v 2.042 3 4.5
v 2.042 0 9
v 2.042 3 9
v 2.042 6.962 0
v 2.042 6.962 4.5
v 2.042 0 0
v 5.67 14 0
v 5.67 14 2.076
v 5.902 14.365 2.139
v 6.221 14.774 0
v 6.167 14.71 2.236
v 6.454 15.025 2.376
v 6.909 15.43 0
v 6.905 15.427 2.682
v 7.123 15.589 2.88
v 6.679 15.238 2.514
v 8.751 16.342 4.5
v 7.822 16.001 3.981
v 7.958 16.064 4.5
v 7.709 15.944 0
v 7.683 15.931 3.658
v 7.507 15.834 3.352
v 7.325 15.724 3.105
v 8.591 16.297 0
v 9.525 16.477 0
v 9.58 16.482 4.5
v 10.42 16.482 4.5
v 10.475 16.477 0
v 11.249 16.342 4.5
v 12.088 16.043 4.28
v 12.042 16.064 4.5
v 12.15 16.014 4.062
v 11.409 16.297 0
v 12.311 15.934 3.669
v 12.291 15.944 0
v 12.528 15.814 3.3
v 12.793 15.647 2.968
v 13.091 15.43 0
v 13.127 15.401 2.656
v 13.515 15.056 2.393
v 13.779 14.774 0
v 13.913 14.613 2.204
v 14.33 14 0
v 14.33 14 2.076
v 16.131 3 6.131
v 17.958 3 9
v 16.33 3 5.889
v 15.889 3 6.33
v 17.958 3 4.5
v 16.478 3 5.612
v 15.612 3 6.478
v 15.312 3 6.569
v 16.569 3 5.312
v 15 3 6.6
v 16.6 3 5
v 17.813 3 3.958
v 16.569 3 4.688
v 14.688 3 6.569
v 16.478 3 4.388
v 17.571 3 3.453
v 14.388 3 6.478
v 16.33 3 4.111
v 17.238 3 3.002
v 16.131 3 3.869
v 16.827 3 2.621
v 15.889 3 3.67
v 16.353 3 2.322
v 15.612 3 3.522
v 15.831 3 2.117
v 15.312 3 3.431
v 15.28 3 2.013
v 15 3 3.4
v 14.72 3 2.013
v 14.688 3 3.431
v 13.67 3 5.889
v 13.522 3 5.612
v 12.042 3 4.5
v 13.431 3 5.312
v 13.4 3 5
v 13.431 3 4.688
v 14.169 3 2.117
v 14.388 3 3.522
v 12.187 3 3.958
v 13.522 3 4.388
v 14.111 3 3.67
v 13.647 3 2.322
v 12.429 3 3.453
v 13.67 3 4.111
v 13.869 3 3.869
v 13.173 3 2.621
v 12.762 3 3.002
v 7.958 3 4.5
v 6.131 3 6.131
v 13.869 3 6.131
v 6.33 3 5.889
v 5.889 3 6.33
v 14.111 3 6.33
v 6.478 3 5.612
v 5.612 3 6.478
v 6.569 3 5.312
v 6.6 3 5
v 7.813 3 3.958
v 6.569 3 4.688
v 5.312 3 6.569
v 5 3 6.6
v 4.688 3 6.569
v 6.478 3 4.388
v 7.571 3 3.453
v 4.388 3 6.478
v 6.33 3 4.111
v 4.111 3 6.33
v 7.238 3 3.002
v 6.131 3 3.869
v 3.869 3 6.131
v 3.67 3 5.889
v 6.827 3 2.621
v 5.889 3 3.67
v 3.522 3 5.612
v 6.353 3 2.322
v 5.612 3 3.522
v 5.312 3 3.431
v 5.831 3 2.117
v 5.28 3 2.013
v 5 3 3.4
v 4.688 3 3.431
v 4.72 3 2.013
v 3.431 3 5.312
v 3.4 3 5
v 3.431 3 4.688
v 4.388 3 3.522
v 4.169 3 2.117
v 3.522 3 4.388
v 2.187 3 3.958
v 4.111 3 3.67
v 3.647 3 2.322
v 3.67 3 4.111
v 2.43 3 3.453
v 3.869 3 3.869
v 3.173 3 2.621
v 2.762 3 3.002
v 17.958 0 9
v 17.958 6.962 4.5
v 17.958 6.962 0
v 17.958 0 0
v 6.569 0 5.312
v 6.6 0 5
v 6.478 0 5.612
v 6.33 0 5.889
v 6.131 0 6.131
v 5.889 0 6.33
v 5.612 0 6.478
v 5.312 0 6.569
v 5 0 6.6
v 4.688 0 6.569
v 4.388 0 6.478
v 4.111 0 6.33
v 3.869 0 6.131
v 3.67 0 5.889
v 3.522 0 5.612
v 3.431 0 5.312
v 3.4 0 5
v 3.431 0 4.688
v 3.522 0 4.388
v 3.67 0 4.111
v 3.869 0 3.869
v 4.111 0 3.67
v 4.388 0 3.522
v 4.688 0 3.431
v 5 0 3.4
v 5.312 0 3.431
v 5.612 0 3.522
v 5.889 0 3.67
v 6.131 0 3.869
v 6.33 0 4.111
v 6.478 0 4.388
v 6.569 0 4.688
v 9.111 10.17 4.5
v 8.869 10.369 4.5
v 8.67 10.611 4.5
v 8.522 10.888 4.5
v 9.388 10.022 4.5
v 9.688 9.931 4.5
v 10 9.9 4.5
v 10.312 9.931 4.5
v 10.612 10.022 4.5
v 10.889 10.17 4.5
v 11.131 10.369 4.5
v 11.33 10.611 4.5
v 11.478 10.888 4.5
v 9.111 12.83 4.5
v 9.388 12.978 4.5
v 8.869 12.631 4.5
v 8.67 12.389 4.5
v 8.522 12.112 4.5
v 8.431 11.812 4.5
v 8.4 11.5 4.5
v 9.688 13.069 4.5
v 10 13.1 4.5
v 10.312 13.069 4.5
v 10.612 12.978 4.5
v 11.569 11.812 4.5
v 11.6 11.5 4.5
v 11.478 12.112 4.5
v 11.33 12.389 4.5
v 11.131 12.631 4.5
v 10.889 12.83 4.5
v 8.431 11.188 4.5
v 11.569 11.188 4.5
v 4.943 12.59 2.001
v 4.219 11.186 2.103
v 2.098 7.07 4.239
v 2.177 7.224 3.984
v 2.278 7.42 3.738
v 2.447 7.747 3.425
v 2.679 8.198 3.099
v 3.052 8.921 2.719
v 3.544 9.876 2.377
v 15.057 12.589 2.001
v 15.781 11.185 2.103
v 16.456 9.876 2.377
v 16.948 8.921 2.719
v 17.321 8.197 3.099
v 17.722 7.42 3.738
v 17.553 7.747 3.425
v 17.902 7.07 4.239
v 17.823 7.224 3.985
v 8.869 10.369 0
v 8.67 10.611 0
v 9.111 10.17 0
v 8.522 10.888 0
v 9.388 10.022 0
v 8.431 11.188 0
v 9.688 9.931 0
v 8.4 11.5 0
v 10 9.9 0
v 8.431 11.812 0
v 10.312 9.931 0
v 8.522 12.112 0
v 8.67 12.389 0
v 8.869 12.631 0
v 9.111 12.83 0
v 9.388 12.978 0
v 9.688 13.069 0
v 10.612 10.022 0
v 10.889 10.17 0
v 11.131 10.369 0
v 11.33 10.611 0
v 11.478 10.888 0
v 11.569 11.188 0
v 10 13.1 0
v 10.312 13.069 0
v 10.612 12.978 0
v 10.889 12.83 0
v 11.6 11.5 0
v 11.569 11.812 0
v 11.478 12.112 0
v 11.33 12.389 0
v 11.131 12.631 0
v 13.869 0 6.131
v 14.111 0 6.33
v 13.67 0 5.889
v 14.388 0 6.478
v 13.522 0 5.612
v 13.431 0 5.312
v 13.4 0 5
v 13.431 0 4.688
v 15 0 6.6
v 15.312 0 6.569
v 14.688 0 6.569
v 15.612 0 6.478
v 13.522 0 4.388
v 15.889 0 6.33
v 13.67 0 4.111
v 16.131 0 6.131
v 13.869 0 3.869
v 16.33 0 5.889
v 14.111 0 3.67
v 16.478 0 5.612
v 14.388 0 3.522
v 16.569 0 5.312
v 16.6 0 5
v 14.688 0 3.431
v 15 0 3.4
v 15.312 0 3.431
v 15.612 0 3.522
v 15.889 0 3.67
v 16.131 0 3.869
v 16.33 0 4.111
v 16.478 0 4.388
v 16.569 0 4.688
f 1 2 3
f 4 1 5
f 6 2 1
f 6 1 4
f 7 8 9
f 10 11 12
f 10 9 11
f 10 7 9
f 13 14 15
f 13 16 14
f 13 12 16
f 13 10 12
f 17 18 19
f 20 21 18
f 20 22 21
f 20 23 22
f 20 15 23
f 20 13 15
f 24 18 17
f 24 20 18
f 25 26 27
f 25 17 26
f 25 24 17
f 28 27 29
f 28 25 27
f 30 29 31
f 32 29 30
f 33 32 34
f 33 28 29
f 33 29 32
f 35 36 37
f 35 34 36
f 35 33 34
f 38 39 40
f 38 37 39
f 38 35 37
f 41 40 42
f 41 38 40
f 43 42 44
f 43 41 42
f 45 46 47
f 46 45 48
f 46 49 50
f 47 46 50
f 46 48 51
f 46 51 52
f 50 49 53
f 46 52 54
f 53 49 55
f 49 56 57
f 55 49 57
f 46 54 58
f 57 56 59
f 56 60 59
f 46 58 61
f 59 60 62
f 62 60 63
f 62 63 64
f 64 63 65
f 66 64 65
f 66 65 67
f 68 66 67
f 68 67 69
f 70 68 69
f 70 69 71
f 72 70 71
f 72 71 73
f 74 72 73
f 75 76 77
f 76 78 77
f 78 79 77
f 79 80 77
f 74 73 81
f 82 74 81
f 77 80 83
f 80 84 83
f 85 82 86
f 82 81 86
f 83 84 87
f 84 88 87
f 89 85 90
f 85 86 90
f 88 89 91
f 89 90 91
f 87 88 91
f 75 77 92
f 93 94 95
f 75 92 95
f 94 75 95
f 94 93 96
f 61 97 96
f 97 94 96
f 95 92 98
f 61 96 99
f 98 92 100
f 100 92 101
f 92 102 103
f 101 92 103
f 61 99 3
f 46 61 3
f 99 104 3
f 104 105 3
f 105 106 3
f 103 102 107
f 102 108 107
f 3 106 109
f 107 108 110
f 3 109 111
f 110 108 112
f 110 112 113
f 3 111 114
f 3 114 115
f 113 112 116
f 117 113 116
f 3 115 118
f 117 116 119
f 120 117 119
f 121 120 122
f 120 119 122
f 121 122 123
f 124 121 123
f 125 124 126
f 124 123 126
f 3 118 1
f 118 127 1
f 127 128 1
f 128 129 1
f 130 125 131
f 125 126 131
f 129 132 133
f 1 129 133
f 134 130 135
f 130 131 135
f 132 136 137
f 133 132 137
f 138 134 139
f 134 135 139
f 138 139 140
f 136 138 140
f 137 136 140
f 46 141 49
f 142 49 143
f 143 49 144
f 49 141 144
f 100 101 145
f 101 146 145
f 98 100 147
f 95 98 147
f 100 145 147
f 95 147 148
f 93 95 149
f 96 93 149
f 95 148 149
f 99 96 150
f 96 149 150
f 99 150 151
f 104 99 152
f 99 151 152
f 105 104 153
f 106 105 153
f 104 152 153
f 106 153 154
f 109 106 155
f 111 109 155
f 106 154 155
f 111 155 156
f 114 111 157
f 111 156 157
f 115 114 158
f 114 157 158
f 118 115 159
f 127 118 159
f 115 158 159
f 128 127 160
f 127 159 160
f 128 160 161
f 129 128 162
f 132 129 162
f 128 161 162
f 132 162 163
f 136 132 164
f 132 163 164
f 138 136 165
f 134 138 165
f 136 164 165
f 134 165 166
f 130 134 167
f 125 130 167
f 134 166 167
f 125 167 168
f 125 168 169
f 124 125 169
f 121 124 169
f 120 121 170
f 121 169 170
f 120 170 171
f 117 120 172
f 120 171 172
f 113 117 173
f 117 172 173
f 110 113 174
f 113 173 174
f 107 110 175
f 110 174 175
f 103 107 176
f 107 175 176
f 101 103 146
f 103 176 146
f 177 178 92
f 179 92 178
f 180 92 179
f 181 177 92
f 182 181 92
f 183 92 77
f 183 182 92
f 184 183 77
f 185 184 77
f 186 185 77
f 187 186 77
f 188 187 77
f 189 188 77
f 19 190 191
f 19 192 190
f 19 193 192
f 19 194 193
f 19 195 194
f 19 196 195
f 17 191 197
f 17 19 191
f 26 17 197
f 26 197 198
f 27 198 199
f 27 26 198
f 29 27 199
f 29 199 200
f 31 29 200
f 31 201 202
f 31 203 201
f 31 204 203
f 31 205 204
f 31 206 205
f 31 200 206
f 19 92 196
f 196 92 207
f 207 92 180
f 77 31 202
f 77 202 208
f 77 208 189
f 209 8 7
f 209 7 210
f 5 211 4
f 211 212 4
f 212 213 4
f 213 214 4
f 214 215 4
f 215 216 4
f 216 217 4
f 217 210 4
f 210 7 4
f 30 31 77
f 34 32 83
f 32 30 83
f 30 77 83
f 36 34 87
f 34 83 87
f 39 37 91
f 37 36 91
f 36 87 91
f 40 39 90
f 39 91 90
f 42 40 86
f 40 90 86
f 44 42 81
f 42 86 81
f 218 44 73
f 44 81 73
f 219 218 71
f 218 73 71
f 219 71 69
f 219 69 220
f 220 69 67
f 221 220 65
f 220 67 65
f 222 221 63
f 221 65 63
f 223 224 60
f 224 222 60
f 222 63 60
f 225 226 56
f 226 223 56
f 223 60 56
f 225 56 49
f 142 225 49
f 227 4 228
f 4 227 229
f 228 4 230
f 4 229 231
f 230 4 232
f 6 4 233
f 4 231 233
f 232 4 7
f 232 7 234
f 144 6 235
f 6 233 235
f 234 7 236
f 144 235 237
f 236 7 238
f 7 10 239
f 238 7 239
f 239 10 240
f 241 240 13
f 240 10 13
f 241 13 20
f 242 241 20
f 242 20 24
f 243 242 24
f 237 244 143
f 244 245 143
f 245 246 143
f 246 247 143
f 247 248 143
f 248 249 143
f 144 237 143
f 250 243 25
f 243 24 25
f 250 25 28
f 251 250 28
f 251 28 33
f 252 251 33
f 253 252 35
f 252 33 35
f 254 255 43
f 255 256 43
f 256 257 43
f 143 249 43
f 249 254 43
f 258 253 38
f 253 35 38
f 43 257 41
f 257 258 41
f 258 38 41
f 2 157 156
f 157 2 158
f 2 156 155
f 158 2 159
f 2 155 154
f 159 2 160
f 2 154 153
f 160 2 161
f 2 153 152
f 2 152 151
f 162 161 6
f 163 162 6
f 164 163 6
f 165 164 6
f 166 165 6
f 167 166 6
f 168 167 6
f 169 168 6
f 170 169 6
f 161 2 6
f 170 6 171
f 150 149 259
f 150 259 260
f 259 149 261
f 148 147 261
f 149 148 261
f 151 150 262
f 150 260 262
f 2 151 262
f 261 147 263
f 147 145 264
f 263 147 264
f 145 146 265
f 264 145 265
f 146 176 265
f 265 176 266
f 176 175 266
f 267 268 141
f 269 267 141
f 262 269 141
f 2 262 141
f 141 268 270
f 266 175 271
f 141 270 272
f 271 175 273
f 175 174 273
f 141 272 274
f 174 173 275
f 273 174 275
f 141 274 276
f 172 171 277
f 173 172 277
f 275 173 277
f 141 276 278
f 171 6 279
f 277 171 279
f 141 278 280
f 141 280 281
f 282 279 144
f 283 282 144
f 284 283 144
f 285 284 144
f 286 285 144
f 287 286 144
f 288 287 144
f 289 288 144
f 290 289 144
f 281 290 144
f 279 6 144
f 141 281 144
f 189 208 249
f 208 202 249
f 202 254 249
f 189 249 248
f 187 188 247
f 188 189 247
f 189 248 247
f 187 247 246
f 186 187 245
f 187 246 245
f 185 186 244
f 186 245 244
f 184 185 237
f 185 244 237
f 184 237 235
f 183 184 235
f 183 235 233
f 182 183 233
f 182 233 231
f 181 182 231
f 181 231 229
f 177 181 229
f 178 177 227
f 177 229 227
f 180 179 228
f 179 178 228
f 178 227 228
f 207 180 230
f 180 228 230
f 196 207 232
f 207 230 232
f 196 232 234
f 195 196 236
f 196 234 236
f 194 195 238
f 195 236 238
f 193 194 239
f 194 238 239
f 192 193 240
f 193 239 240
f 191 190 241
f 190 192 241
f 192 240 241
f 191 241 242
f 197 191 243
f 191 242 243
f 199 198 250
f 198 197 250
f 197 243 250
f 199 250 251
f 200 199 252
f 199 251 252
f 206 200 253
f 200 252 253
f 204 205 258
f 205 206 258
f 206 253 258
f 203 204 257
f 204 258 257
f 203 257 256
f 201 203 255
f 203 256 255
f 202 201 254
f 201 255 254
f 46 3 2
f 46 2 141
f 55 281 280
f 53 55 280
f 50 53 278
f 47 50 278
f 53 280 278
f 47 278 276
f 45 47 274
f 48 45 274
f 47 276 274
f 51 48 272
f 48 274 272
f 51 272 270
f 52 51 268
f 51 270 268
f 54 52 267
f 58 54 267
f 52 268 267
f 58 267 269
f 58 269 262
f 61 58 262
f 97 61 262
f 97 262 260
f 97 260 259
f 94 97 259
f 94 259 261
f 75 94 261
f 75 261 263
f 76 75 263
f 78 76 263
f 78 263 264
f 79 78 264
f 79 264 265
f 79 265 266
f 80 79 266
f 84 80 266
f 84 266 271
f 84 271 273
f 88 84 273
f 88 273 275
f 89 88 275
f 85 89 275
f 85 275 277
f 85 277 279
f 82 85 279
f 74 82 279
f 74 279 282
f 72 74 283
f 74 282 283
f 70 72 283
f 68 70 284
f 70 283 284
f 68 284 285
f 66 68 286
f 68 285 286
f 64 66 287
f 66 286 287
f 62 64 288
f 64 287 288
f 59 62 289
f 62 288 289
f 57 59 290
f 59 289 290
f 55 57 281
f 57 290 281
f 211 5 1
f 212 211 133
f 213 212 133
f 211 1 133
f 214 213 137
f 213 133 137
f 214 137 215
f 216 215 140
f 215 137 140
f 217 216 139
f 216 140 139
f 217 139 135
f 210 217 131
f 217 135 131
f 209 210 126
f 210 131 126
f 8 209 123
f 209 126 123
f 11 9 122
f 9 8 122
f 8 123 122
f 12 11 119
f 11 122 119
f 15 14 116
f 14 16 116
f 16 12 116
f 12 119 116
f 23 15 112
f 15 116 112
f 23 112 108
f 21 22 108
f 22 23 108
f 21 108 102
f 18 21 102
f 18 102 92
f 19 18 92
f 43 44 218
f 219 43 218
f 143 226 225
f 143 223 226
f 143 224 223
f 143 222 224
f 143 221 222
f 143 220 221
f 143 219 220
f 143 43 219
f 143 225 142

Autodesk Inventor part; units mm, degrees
ref_plane "YZ Plane" through (0, 0, 0) normal (1, 0, 0) x (0, 1, 0)
ref_plane "XZ Plane" through (0, 0, 0) normal (0, 1, 0) x (-1, 0, 0)
ref_plane "XY Plane" through (0, 0, 0) normal (0, 0, 1) x (1, 0, 0)
sketch "Sketch1" plane through (0, 0, 0) normal (0, 0, 1) x (1, 0, 0)
  circle A0 centre (10, 11.5) radius 1.6
  line L0 (0, 0) -> (20.0001, 0)
  line L1 (0, 0) -> (0, 3)
  line L2 (20.0001, 0) -> (20.0001, 3)
  line L3 (0, 3) -> (16, 3) construction
  line L4 (20.0001, 3) -> (36.0001, 3) construction
  arc A1 (14.3301, 14) -> (5.6699, 14) centre (10, 11.5) ccw
  line L5 (10, 11.5) -> (5.6699, 14) construction
  line L6 (10, 11.5) -> (14.3301, 14) construction
  line L7 (5.6699, 14) -> (0, 3)
  line L8 (14.3301, 14) -> (20.0001, 3)
  dimension "d17" = 3
  dimension "d18" = 3
  dimension "d19" = 11.5
  dimension "d23" = 90
  dimension "d24" = 90
  dimension "d25" = 10
  dimension "d31" = 5
  dimension "d32" = 120
  dimension "d33" = 14
extrude "Extrusion1" add sketch "Sketch1" along normal blind 4.5
sketch "Sketch4" plane through (0, 0, 4.5) normal (0, 0, 1) x (1, 0, 0)
  line L0 (0, 3) -> (0, 0) projected
  line L1 (20.0001, 0) -> (20.0001, 3) projected
  line L2 (0, 0) -> (20.0001, 0)
  line L3 (20.0001, 0) -> (20.0001, 3)
  line L4 (3.884, 22.9404) -> (-0.9789, 3.2417) projected
  line L5 (20.0001, 3) -> (0, 3)
  line L6 (0, 3) -> (0, 0)
extrude "Extrusion2" add sketch "Sketch4" along normal blind 4.5
sketch "Sketch5" plane through (0, 0, 0) normal (0, -1, 0) x (1, 0, 0)
  circle A0 centre (5, 5) radius 1.6
  circle A1 centre (15, 5) radius 1.6
  line L0 (0, 0) -> (20.0001, 0) projected
  dimension "d13" = 3.2
  dimension "d14" = 3.2
  dimension "d38" = 5
  dimension "d39" = 5
extrude "Extrusion3" cut sketch "Sketch5" against normal through all
sketch "Sketch6" plane through (0, 3, 9) normal (0, 1, 0) x (1, 0, 0)
  circle A0 centre (5, 4) radius 1.6 projected
  circle A1 centre (5, 4) radius 3
  circle A2 centre (15, 4) radius 1.6 projected
  circle A3 centre (15, 4) radius 3
  line L0 (0, 9) -> (20.0001, 9) projected
  dimension "d34" = 6
  dimension "d35" = 6
  dimension "d40" = 5
  dimension "d41" = 5
extrude "Extrusion4" cut sketch "Sketch6" along normal up to next
sketch "Sketch7" plane through (0, 0, 0) normal (0, -1, 0) x (1, 0, 0)
  line L0 (0, 0) -> (0, 9) projected
  line L1 (2.042, 0) -> (0, 0)
  line L2 (0, 0) -> (0, 9)
  line L3 (0, 9) -> (2.042, 9)
  line L4 (2.042, 9) -> (2.042, 0)
extrude "Extrusion5" cut sketch "Sketch7" against normal up to next
sketch "Sketch8" plane through (20.0001, 0, 0) normal (0, -1, 0) x (1, 0, 0)
  line L0 (0, 4.5) -> (0, 9) projected
  line L1 (-2.042, 0) -> (0, 0)
  line L2 (0, 0) -> (0, 9)
  line L3 (0, 9) -> (-2.042, 9)
  line L4 (-2.042, 9) -> (-2.042, 0)
  point P0 (-20.0001, 0)
extrude "Extrusion6" cut sketch "Sketch8" against normal up to next
properties part number "lower_deck_shaft_mount_for_AD"
